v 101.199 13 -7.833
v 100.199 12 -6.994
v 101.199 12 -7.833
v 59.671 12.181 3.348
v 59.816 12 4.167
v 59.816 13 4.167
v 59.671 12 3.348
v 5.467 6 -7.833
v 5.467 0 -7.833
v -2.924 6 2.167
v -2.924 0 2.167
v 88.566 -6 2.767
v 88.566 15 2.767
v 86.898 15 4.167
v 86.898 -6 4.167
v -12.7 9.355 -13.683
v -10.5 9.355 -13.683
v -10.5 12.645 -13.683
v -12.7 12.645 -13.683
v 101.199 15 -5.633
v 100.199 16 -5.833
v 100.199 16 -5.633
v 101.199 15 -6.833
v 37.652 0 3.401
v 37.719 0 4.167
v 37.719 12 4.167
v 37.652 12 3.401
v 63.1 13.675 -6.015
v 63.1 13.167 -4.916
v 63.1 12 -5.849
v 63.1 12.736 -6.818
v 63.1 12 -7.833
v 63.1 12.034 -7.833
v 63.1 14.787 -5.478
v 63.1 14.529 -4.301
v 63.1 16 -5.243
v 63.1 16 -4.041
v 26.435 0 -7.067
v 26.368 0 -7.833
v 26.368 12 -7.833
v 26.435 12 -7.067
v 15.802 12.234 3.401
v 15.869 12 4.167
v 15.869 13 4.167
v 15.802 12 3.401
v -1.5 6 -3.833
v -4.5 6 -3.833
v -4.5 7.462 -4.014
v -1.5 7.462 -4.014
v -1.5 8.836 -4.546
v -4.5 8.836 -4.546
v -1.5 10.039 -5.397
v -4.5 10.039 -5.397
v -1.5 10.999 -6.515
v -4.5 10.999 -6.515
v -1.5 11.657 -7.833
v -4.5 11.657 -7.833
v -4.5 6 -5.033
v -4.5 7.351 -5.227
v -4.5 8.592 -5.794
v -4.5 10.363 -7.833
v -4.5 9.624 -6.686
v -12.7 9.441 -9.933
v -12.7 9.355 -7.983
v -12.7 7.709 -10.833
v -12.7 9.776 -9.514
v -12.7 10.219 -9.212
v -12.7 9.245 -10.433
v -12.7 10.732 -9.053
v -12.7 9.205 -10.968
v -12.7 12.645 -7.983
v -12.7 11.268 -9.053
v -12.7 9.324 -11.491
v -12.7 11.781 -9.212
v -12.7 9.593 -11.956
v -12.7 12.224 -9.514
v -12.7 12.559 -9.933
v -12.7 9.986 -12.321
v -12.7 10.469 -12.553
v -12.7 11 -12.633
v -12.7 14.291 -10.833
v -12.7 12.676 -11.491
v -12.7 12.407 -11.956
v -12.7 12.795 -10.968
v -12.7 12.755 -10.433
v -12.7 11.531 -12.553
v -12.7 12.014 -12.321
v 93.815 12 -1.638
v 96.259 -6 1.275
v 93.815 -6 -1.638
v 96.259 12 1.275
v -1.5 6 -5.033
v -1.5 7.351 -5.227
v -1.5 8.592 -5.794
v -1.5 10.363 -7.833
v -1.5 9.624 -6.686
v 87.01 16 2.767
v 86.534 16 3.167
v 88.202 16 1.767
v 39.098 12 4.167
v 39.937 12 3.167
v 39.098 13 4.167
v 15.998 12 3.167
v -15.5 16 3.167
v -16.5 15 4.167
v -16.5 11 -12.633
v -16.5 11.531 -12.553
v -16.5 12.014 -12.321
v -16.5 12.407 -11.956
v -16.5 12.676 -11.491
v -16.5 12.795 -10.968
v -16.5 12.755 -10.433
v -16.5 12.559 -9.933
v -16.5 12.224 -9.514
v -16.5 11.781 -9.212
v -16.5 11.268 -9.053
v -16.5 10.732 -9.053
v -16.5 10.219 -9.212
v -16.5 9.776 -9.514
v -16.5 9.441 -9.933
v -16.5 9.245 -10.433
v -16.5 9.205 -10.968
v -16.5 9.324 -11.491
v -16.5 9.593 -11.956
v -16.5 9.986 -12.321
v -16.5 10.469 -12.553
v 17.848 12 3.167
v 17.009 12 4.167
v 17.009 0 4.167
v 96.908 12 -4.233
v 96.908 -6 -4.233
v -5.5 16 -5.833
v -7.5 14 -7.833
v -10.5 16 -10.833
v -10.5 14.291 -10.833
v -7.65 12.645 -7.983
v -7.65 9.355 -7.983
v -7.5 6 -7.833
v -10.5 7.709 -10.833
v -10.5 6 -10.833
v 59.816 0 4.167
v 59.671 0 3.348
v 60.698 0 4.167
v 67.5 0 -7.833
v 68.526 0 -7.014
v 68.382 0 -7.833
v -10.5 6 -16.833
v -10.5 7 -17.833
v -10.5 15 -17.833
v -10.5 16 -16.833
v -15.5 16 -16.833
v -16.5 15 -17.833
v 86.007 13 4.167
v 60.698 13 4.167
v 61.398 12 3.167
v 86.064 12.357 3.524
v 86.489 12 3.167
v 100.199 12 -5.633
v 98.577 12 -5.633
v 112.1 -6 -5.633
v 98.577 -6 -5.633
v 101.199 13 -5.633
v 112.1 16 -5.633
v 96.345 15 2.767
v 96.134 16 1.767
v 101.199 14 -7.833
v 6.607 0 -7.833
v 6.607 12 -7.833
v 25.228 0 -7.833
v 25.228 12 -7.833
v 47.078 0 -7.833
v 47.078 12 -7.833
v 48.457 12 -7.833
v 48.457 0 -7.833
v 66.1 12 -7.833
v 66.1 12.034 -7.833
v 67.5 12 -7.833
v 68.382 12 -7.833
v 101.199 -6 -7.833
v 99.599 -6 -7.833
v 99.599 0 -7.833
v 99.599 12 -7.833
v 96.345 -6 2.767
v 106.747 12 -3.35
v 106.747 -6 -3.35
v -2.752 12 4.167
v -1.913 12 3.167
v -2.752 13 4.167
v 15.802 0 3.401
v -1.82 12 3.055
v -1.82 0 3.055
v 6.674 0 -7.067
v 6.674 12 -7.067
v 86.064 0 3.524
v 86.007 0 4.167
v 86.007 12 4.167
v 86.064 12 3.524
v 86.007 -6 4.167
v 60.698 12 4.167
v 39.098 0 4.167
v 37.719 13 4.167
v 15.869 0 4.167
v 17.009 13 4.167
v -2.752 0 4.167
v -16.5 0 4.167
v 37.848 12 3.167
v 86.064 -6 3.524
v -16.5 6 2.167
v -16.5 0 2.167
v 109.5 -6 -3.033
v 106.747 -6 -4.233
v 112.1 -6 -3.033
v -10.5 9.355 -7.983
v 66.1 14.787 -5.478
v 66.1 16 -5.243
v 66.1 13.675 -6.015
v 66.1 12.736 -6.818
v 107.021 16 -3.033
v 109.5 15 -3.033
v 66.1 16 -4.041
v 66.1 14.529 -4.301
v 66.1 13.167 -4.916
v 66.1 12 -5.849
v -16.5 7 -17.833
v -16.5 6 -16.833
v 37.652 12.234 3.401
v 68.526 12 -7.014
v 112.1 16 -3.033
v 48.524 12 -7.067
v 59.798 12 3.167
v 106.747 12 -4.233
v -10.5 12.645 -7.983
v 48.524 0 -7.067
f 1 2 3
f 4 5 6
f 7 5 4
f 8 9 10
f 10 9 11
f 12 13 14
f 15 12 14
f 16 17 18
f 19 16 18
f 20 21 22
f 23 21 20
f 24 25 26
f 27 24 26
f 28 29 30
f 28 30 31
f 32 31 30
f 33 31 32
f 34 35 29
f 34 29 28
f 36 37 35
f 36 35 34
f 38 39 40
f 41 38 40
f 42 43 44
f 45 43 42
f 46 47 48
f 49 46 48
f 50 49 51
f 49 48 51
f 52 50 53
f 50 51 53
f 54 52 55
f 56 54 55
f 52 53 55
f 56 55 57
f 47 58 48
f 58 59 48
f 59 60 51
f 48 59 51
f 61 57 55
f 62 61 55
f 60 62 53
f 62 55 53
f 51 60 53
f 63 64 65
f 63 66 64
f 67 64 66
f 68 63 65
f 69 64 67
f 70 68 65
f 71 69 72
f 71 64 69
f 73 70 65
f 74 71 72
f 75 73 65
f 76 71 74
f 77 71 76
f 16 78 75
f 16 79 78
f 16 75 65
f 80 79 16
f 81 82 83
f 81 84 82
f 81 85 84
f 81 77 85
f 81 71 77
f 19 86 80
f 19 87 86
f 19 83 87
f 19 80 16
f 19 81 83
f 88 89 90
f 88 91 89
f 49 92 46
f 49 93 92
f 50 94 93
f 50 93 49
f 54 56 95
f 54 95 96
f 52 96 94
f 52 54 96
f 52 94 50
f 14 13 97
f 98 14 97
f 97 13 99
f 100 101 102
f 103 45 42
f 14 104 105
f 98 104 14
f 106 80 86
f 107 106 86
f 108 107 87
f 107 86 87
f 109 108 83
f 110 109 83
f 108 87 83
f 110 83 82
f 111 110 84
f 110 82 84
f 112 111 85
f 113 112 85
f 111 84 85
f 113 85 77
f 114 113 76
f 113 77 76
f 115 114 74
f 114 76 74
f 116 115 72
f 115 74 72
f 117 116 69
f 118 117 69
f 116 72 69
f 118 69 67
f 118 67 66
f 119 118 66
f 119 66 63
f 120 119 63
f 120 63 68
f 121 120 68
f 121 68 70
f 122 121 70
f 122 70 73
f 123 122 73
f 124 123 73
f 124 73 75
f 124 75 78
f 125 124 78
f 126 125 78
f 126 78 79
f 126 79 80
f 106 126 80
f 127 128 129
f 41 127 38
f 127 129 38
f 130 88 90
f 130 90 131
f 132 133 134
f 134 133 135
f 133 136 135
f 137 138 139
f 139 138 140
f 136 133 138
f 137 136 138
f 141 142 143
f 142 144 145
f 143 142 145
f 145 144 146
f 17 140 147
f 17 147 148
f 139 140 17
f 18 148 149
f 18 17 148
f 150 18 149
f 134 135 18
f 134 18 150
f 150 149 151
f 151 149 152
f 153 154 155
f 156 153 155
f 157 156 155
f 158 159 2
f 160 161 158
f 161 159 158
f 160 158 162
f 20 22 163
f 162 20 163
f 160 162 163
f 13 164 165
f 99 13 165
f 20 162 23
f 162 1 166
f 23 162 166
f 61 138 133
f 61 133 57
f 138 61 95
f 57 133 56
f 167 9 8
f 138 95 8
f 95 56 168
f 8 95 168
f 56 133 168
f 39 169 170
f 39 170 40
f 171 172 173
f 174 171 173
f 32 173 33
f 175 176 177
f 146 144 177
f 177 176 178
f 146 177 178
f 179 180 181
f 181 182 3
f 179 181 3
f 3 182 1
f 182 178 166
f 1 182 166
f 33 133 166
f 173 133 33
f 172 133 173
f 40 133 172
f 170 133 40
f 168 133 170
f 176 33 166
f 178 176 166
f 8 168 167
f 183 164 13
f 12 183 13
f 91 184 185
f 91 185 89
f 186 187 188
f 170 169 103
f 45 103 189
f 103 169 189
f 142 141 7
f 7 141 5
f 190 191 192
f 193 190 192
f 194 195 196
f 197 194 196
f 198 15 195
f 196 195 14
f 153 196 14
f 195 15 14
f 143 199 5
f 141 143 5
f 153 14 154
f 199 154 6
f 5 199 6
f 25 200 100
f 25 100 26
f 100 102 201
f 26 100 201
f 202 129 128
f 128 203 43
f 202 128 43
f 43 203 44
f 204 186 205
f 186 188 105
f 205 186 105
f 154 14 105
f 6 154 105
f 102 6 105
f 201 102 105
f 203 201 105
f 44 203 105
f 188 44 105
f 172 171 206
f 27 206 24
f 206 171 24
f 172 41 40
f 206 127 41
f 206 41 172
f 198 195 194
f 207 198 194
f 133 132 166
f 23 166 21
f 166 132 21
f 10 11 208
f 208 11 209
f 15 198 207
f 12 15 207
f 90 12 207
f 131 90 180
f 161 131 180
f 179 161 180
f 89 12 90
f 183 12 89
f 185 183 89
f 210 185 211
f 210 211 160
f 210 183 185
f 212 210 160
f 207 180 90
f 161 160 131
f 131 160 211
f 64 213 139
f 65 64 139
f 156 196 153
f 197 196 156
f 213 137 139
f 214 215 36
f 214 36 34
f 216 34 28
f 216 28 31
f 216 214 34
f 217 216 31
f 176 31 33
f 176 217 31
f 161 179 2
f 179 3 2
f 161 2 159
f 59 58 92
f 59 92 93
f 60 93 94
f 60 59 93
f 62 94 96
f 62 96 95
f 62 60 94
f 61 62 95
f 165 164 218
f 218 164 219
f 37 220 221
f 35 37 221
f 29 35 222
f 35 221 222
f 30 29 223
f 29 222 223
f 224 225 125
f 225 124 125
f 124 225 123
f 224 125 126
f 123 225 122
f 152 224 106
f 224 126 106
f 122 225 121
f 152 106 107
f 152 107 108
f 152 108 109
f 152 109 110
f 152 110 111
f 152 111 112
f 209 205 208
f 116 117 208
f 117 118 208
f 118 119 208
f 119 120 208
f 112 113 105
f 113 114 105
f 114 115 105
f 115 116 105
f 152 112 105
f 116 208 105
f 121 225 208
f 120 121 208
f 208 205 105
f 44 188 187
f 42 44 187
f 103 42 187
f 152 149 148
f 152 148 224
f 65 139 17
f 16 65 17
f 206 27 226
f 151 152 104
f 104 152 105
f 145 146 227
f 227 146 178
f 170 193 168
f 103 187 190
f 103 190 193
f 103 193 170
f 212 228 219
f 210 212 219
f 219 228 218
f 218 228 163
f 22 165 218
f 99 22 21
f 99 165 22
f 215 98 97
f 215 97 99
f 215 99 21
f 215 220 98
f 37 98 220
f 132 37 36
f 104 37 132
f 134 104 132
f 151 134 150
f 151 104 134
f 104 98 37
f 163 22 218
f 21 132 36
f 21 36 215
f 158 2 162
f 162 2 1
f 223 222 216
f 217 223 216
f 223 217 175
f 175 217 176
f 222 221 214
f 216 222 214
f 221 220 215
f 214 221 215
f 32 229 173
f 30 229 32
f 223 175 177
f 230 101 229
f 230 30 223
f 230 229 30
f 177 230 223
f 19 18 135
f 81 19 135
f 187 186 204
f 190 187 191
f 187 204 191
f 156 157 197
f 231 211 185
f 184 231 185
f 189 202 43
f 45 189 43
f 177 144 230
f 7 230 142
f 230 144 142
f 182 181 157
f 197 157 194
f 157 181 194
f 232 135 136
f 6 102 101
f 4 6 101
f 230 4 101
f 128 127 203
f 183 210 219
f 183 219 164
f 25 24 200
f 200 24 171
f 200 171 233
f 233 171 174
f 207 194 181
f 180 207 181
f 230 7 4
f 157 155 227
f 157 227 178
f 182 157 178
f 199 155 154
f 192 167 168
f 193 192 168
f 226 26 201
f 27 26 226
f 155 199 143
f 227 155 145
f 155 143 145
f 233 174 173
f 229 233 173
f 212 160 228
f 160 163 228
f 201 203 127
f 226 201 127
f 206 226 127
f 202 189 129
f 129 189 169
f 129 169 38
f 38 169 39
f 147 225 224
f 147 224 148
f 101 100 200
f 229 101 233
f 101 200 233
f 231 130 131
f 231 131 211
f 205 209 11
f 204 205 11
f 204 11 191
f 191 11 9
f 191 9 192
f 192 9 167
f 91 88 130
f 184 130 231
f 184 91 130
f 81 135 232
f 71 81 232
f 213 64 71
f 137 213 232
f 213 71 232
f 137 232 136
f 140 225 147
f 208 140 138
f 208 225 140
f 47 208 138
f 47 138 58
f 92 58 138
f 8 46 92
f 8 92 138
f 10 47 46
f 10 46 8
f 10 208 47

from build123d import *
from OCP.BRepFilletAPI import BRepFilletAPI_MakeChamfer

# Parameters (mm, degrees)
SKETCH1_W           = 126
SKETCH1_H           = 12
BOSS_EXTRUDE1_DEPTH = 16
SKETCH2_W           = 6
SKETCH2_H           = 16
BOSS_EXTRUDE2_DEPTH = 10
SKETCH3_R           = 1.8
CUT_EXTRUDE1_DEPTH  = 10
CUT_EXTRUDE2_DEPTH  = 2.2
CHAMFER1_SIZE       = 3
CUT_EXTRUDE4_DEPTH  = 12
CUT_EXTRUDE5_DEPTH  = 6
SKETCH8_W           = 8.301447347
SKETCH8_H           = 4
CUT_EXTRUDE6_DEPTH  = 2.2
CUT_EXTRUDE7_DEPTH  = 112.589774522
SKETCH10_W          = 2.6
SKETCH10_H          = 16
BOSS_EXTRUDE3_DEPTH = 2.6
CHAMFER2_SIZE       = 2
CHAMFER3_SIZE       = 1
CHAMFER3_SIZE2      = 0.709807814
CHAMFER3_SIZE2_2    = 0.718015043
CUT_EXTRUDE8_START  = -12
SKETCH11_R          = 6
SKETCH11_R_2        = 4.8
CUT_EXTRUDE8_DEPTH  = 3
BOSS_EXTRUDE4_DEPTH = 6
CHAMFER4_SIZE       = 1
CUT_EXTRUDE9_START  = -46
SKETCH13_R          = 6
SKETCH13_R_2        = 4.8
CUT_EXTRUDE9_DEPTH  = 3


with BuildPart() as part:
    # Sketch1 → Boss-Extrude1 (new body)
    with BuildSketch(Plane(origin=(0, 0, 0), x_dir=(1, 0, 0), z_dir=(0, 1, 0))):
        with Locations((46.5, 1.833333333)):
            Rectangle(SKETCH1_W, SKETCH1_H)
    extrude(amount=BOSS_EXTRUDE1_DEPTH)

    # Sketch2 → Boss-Extrude2 (add)
    with BuildSketch(Plane(origin=(0, 0, -7.833333333), x_dir=(-1, 0, 0), z_dir=(0, 0, -1))):
        with Locations((13.5, 8)):
            Rectangle(SKETCH2_W, SKETCH2_H)
    extrude(amount=BOSS_EXTRUDE2_DEPTH)

    # Sketch3 → Cut-Extrude1 (cut)
    with BuildSketch(Plane(origin=(-10.5, 0, 0), x_dir=(0, 0, -1), z_dir=(1, 0, 0))):
        with Locations((10.833333333, 11)):
            Circle(SKETCH3_R)
    extrude(amount=-CUT_EXTRUDE1_DEPTH, mode=Mode.SUBTRACT)

    # Sketch4 → Cut-Extrude2 (cut)
    with BuildSketch(Plane(origin=(-10.5, 0, 0), x_dir=(0, 0, -1), z_dir=(1, 0, 0))):
        Polygon((7.983333333, 12.645448267), (7.983333333, 9.354551733), (10.833333333, 7.709103466), (13.683333333, 9.354551733), (13.683333333, 12.645448267), (10.833333333, 14.290896534), align=None)
    extrude(amount=-CUT_EXTRUDE2_DEPTH, mode=Mode.SUBTRACT)

    # Chamfer1
    # the kernel refuses this chamfer: 3 mm, written as the material it adds along each edge
    with BuildSketch(Plane(origin=(-10.5, 0, -7.833333333), x_dir=(1, 0, 0), z_dir=(0, 1, 0))) as chamfer1_piece_1_section:
        Polygon((CHAMFER1_SIZE, 0), (0, CHAMFER1_SIZE), (0, 0), align=None)
    chamfer1_piece_1 = extrude(amount=16, mode=Mode.PRIVATE)
    chamfer1_piece_1 = split(chamfer1_piece_1, bisect_by=Plane(origin=(-10.5, 0, -7.983333333), z_dir=(0, 0, 1)), keep=Keep.TOP, mode=Mode.PRIVATE)
    add(chamfer1_piece_1)
    with BuildSketch(Plane(origin=(-10.5, 0, -7.833333333), x_dir=(1, 0, 0), z_dir=(0, 1, 0))) as chamfer1_piece_2_section:
        Polygon((CHAMFER1_SIZE, 0), (0, CHAMFER1_SIZE), (0, 0), align=None)
    chamfer1_piece_2 = extrude(amount=23.715048964, mode=Mode.PRIVATE)
    chamfer1_piece_2 = split(chamfer1_piece_2, bisect_by=Plane(origin=(-10.5, 7.080865705, -11.921473054), z_dir=(0, -0.8660254037844421, 0.499999999999994)), keep=Keep.TOP, mode=Mode.PRIVATE)
    add(chamfer1_piece_2)
    with BuildSketch(Plane(origin=(-10.5, -7.715048964, -7.833333333), x_dir=(1, 0, 0), z_dir=(0, 1, 0))) as chamfer1_piece_3_section:
        Polygon((CHAMFER1_SIZE, 0), (0, CHAMFER1_SIZE), (0, 0), align=None)
    chamfer1_piece_3 = extrude(amount=23.715048964, mode=Mode.PRIVATE)
    chamfer1_piece_3 = split(chamfer1_piece_3, bisect_by=Plane(origin=(-10.5, 7.490372054, 0.945520585), z_dir=(0, 0.8660254037844354, 0.5000000000000058)), keep=Keep.TOP, mode=Mode.PRIVATE)
    add(chamfer1_piece_3)

    # Sketch6 → Cut-Extrude4 (cut)
    with BuildSketch(Plane.XZ):
        Polygon((27.078053453, -7.833333333), (47.078053453, -7.833333333), (37.008857879, 4.166666667), (17.008857879, 4.166666667), align=None)
        Polygon((49.166705116, -7.833333333), (67.5, -7.833333333), (59.097509541, 4.166666667), (39.097509541, 4.166666667), align=None)
        Polygon((7.316705116, -7.833333333), (25.228053453, -7.833333333), (15.158857879, 4.166666667), (-2.752490459, 4.166666667), (-1.819672283, 3.054977255), align=None)
        Polygon((60.697509541, 4.166666667), (69.1, -7.833333333), (99.598552653, -7.833333333), (85.297509541, 4.166666667), align=None)
        Polygon((109.5, 2.766666667), (96.345030751, 2.766666667), (109.5, -3.033333333), align=None)
        Polygon((93.814978285, -1.637778805), (96.908239719, -4.233333333), (106.747497018, -4.233333333), (106.747497018, -3.349795), (96.258797751, 1.274651823), align=None)
        Polygon((98.576694749, -5.633333333), (101.198552653, -7.833333333), (109.5, -7.833333333), (109.5, -5.633333333), align=None)
        Polygon((109.5, 4.166666667), (86.897509541, 4.166666667), (88.565964571, 2.766666667), (96.345030751, 2.766666667), (109.5, 2.766666667), align=None)
    extrude(amount=-CUT_EXTRUDE4_DEPTH, mode=Mode.SUBTRACT)

    # Sketch7 → Cut-Extrude5 (cut)
    with BuildSketch(Plane.XZ):
        Polygon((5.466705116, -7.833333333), (-2.924291196, 2.166666667), (-16.5, 2.166666667), (-16.5, -17.833333333), (-10.5, -17.833333333), (-10.5, -10.833333333), (-7.5, -7.833333333), align=None)
    extrude(amount=-CUT_EXTRUDE5_DEPTH, mode=Mode.SUBTRACT)

    # Sketch8 → Cut-Extrude6 (cut)
    with BuildSketch(Plane(origin=(0, 0, -7.833333333), x_dir=(-1, 0, 0), z_dir=(0, 0, -1))):
        with Locations((-105.349276327, 14)):
            Rectangle(SKETCH8_W, SKETCH8_H)
    extrude(amount=-CUT_EXTRUDE6_DEPTH, mode=Mode.SUBTRACT)

    # Sketch9 → Cut-Extrude7 (cut, through all)
    with BuildSketch(Plane.XZ.offset(-12)):
        Polygon((109.5, -3.033333333), (109.5, 4.166666667), (86.897509541, 4.166666667), (88.565964571, 2.766666667), (96.345030751, 2.766666667), align=None)
    extrude(amount=-CUT_EXTRUDE7_DEPTH, mode=Mode.SUBTRACT)

    # Sketch10 → Boss-Extrude3 (add)
    with BuildSketch(Plane(origin=(109.5, 0, 0), x_dir=(0, 0, -1), z_dir=(1, 0, 0))):
        with Locations((4.333333333, 8)):
            Rectangle(SKETCH10_W, SKETCH10_H)
    extrude(amount=BOSS_EXTRUDE3_DEPTH)

    # Chamfer2
    chamfer2_edges = [part.edges().sort_by_distance(p)[0] for p in [
        (46.849276326, 16, -7.833333333),
    ]]
    chamfer(chamfer2_edges, length=CHAMFER2_SIZE)

    # Chamfer3: one chamfer whose edges measure the first distance from different faces: ONE call of the kernel's chamfer builder (chamfer() names one face for all edges)
    chamfer3_edges_1 = [part.edges().sort_by_distance(p)[0] for p in [
        (7.316705116, 6, -7.833333333),
    ]]
    chamfer3_side_1 = [part.faces().sort_by_distance(p)[0] for p in [
        (2.282107329, 6, -1.833333333),
    ]]
    chamfer3_edges_2 = [part.edges().sort_by_distance(p)[0] for p in [
        (15.158857879, 6, 4.166666667),
    ]]
    chamfer3_side_2 = [part.faces().sort_by_distance(p)[0] for p in [
        (20.193455666, 6, -1.833333333),
    ]]
    chamfer3_edges_3 = [part.edges().sort_by_distance(p)[0] for p in [
        (59.097509541, 6, 4.166666667),
    ]]
    chamfer3_side_3 = [part.faces().sort_by_distance(p)[0] for p in [
        (63.298754771, 6, -1.833333333),
    ]]
    chamfer3_edges_4 = [part.edges().sort_by_distance(p)[0] for p in [
        (49.166705116, 6, -7.833333333),
    ]]
    chamfer3_side_4 = [part.faces().sort_by_distance(p)[0] for p in [
        (44.132107329, 6, -1.833333333),
    ]]
    chamfer3_edges_5 = [part.edges().sort_by_distance(p)[0] for p in [
        (37.008857879, 6, 4.166666667),
    ]]
    chamfer3_side_5 = [part.faces().sort_by_distance(p)[0] for p in [
        (42.043455666, 6, -1.833333333),
    ]]
    chamfer3_edges_6 = [part.edges().sort_by_distance(p)[0] for p in [
        (27.078053453, 6, -7.833333333),
    ]]
    chamfer3_side_6 = [part.faces().sort_by_distance(p)[0] for p in [
        (22.043455666, 6, -1.833333333),
    ]]
    chamfer3_edges_7 = [part.edges().sort_by_distance(p)[0] for p in [
        (-13.5, 16, -17.833333333),
        (-13.5, 6, -17.833333333),
        (-16.5, 16, -6.833333333),
        (35.198754771, 16, 4.166666667),
    ]]
    chamfer3_edges_8 = [part.edges().sort_by_distance(p)[0] for p in [
        (85.297509541, 6, 4.166666667),
    ]]
    chamfer3_side_8 = [part.faces().sort_by_distance(p)[0] for p in [
        (92.448031097, 6, -1.833333333),
    ]]
    chamfer3_edges_9 = [part.edges().sort_by_distance(p)[0] for p in [
        (69.1, 6, -7.833333333),
    ]]
    chamfer3_side_9 = [part.faces().sort_by_distance(p)[0] for p in [
        (64.898754771, 6, -1.833333333),
    ]]
    chamfer3 = BRepFilletAPI_MakeChamfer(part.part.solid().wrapped)
    for e in chamfer3_edges_1:
        chamfer3.Add(CHAMFER3_SIZE, CHAMFER3_SIZE2, e.wrapped, chamfer3_side_1[0].wrapped)  # the first distance lies on this face
    for e in chamfer3_edges_2:
        chamfer3.Add(CHAMFER3_SIZE, CHAMFER3_SIZE2, e.wrapped, chamfer3_side_2[0].wrapped)  # the first distance lies on this face
    for e in chamfer3_edges_3:
        chamfer3.Add(CHAMFER3_SIZE, CHAMFER3_SIZE2_2, e.wrapped, chamfer3_side_3[0].wrapped)  # the first distance lies on this face
    for e in chamfer3_edges_4:
        chamfer3.Add(CHAMFER3_SIZE, CHAMFER3_SIZE2, e.wrapped, chamfer3_side_4[0].wrapped)  # the first distance lies on this face
    for e in chamfer3_edges_5:
        chamfer3.Add(CHAMFER3_SIZE, CHAMFER3_SIZE2, e.wrapped, chamfer3_side_5[0].wrapped)  # the first distance lies on this face
    for e in chamfer3_edges_6:
        chamfer3.Add(CHAMFER3_SIZE, CHAMFER3_SIZE2, e.wrapped, chamfer3_side_6[0].wrapped)  # the first distance lies on this face
    for e in chamfer3_edges_7:
        chamfer3.Add(CHAMFER3_SIZE, e.wrapped)
    for e in chamfer3_edges_8:
        chamfer3.Add(CHAMFER3_SIZE, CHAMFER3_SIZE2, e.wrapped, chamfer3_side_8[0].wrapped)  # the first distance lies on this face
    for e in chamfer3_edges_9:
        chamfer3.Add(CHAMFER3_SIZE, CHAMFER3_SIZE2_2, e.wrapped, chamfer3_side_9[0].wrapped)  # the first distance lies on this face
    add(Compound.cast(chamfer3.Shape()), mode=Mode.REPLACE)

    # Sketch11 → Cut-Extrude8 (cut)
    with BuildSketch(Plane.ZY.offset(16.5).offset(CUT_EXTRUDE8_START)):
        with Locations((-9.833333333, 6)):
            Circle(SKETCH11_R)
        with Locations((-9.833333333, 6)):
            Circle(SKETCH11_R_2, mode=Mode.SUBTRACT)
    extrude(amount=-CUT_EXTRUDE8_DEPTH, mode=Mode.SUBTRACT)

    # Sketch12 → Boss-Extrude4 (add)
    with BuildSketch(Plane.XZ):
        Polygon((86.007317356, 4.166666667), (86.063553985, 3.523879057), (99.598552653, -7.833333333), (101.198552653, -7.833333333), (98.576694749, -5.633333333), (112.1, -5.633333333), (112.1, -3.033333333), (109.5, -3.033333333), (96.345030751, 2.766666667), (88.565964571, 2.766666667), (86.897509541, 4.166666667), align=None)
        Polygon((96.258797751, 1.274651823), (93.814978285, -1.637778805), (96.908239719, -4.233333333), (106.747497018, -4.233333333), (106.747497018, -3.349795), align=None, mode=Mode.SUBTRACT)
    extrude(amount=BOSS_EXTRUDE4_DEPTH)

    # Chamfer4
    # the kernel refuses this chamfer: 1 mm, written as the material it takes off along each edge
    with BuildSketch(Plane(origin=(-5.324173446, 12, 4.166666667), x_dir=(0, 1, 0), z_dir=(1, 0, 0))) as chamfer4_piece_1_section:
        Polygon((CHAMFER4_SIZE, 0), (0, -CHAMFER4_SIZE), (0, 0), align=None)
    chamfer4_piece_1 = extrude(amount=23.764522127, mode=Mode.PRIVATE)
    chamfer4_piece_1 = split(chamfer4_piece_1, bisect_by=Plane(origin=(-3.81504792, 12, 5.432973339), z_dir=(0.7660444431189749, 0, 0.6427876096865432)), keep=Keep.TOP, mode=Mode.PRIVATE)
    chamfer4_piece_1 = split(chamfer4_piece_1, bisect_by=Plane(origin=(6.695762747, 12, 14.252590694), z_dir=(-0.766044443118975, 0, -0.642787609686543)), keep=Keep.TOP, mode=Mode.PRIVATE)
    add(chamfer4_piece_1, mode=Mode.SUBTRACT)
    with BuildSketch(Plane(origin=(-5.324173446, 12, 4.166666667), x_dir=(0, 1, 0), z_dir=(1, 0, 0))) as chamfer4_piece_2_section:
        Polygon((CHAMFER4_SIZE, 0), (0, -CHAMFER4_SIZE), (0, 0), align=None)
    chamfer4_piece_2 = extrude(amount=23.764522127, mode=Mode.PRIVATE)
    chamfer4_piece_2 = split(chamfer4_piece_2, bisect_by=Plane(origin=(15.707682269, 12, 2.326617719), z_dir=(-0.9961946980917459, 0, 0.08715574274765488)), keep=Keep.TOP, mode=Mode.PRIVATE)
    chamfer4_piece_2 = split(chamfer4_piece_2, bisect_by=Plane(origin=(6.695762747, 12, 14.252590694), z_dir=(0.766044443118975, 0, 0.642787609686543)), keep=Keep.TOP, mode=Mode.PRIVATE)
    add(chamfer4_piece_2, mode=Mode.SUBTRACT)
    with BuildSketch(Plane(origin=(-5.324173446, 12, 4.166666667), x_dir=(0, 1, 0), z_dir=(1, 0, 0))) as chamfer4_piece_3_section:
        Polygon((CHAMFER4_SIZE, 0), (0, -CHAMFER4_SIZE), (0, 0), align=None)
    chamfer4_piece_3 = extrude(amount=23.764522127, mode=Mode.PRIVATE)
    chamfer4_piece_3 = split(chamfer4_piece_3, bisect_by=Plane(origin=(7.781387312, 12, 15.163537865), z_dir=(0.7660444431189742, 0, 0.642787609686544)), keep=Keep.TOP, mode=Mode.PRIVATE)
    add(chamfer4_piece_3, mode=Mode.SUBTRACT)
    with BuildSketch(Plane(origin=(36.525826554, 12, 4.166666667), x_dir=(0, 1, 0), z_dir=(1, 0, 0))) as chamfer4_piece_4_section:
        Polygon((CHAMFER4_SIZE, 0), (0, -CHAMFER4_SIZE), (0, 0), align=None)
    chamfer4_piece_4 = extrude(amount=25.861381019, mode=Mode.PRIVATE)
    chamfer4_piece_4 = split(chamfer4_piece_4, bisect_by=Plane(origin=(36.809280971, 12, 4.404513164), z_dir=(-0.7660444431189739, 0, -0.6427876096865442)), keep=Keep.TOP, mode=Mode.PRIVATE)
    add(chamfer4_piece_4, mode=Mode.SUBTRACT)
    with BuildSketch(Plane(origin=(36.525826554, 12, 4.166666667), x_dir=(0, 1, 0), z_dir=(1, 0, 0))) as chamfer4_piece_5_section:
        Polygon((CHAMFER4_SIZE, 0), (0, -CHAMFER4_SIZE), (0, 0), align=None)
    chamfer4_piece_5 = extrude(amount=25.861381019, mode=Mode.PRIVATE)
    chamfer4_piece_5 = split(chamfer4_piece_5, bisect_by=Plane(origin=(37.709604739, 12, 4.063099495), z_dir=(-0.9961946980917457, 0, 0.0871557427476573)), keep=Keep.TOP, mode=Mode.PRIVATE)
    add(chamfer4_piece_5, mode=Mode.SUBTRACT)
    with BuildSketch(Plane(origin=(36.525826554, 12, 4.166666667), x_dir=(0, 1, 0), z_dir=(1, 0, 0))) as chamfer4_piece_6_section:
        Polygon((CHAMFER4_SIZE, 0), (0, -CHAMFER4_SIZE), (0, 0), align=None)
    chamfer4_piece_6 = extrude(amount=25.861381019, mode=Mode.PRIVATE)
    chamfer4_piece_6 = split(chamfer4_piece_6, bisect_by=Plane(origin=(38.03495208, 12, 5.432973339), z_dir=(0.7660444431189741, 0, 0.6427876096865441)), keep=Keep.TOP, mode=Mode.PRIVATE)
    chamfer4_piece_6 = split(chamfer4_piece_6, bisect_by=Plane(origin=(51.671653173, 12, 14.771888638), z_dir=(-0.8191520442889891, 0, -0.57357643635105)), keep=Keep.TOP, mode=Mode.PRIVATE)
    add(chamfer4_piece_6, mode=Mode.SUBTRACT)
    with BuildSketch(Plane(origin=(36.525826554, 12, 4.166666667), x_dir=(0, 1, 0), z_dir=(1, 0, 0))) as chamfer4_piece_7_section:
        Polygon((CHAMFER4_SIZE, 0), (0, -CHAMFER4_SIZE), (0, 0), align=None)
    chamfer4_piece_7 = extrude(amount=25.861381019, mode=Mode.PRIVATE)
    chamfer4_piece_7 = split(chamfer4_piece_7, bisect_by=Plane(origin=(59.113254259, 12, 0.183893737), z_dir=(-0.9848077530122082, 0, 0.17364817766692958)), keep=Keep.TOP, mode=Mode.PRIVATE)
    chamfer4_piece_7 = split(chamfer4_piece_7, bisect_by=Plane(origin=(51.671653173, 12, 14.771888638), z_dir=(0.8191520442889891, 0, 0.57357643635105)), keep=Keep.TOP, mode=Mode.PRIVATE)
    add(chamfer4_piece_7, mode=Mode.SUBTRACT)
    with BuildSketch(Plane(origin=(36.525826554, 12, 4.166666667), x_dir=(0, 1, 0), z_dir=(1, 0, 0))) as chamfer4_piece_8_section:
        Polygon((CHAMFER4_SIZE, 0), (0, -CHAMFER4_SIZE), (0, 0), align=None)
    chamfer4_piece_8 = extrude(amount=25.861381019, mode=Mode.PRIVATE)
    chamfer4_piece_8 = split(chamfer4_piece_8, bisect_by=Plane(origin=(52.745269287, 12, 15.523642735), z_dir=(0.8191520442889892, 0, 0.5735764363510499)), keep=Keep.TOP, mode=Mode.PRIVATE)
    add(chamfer4_piece_8, mode=Mode.SUBTRACT)
    with BuildSketch(Plane(origin=(14.437174891, 12, 4.166666667), x_dir=(0, 1, 0), z_dir=(1, 0, 0))) as chamfer4_piece_9_section:
        Polygon((CHAMFER4_SIZE, 0), (0, -CHAMFER4_SIZE), (0, 0), align=None)
    chamfer4_piece_9 = extrude(amount=25.85317379, mode=Mode.PRIVATE)
    chamfer4_piece_9 = split(chamfer4_piece_9, bisect_by=Plane(origin=(14.860675852, 12, 4.522026168), z_dir=(-0.766044443118975, 0, -0.642787609686543)), keep=Keep.TOP, mode=Mode.PRIVATE)
    add(chamfer4_piece_9, mode=Mode.SUBTRACT)
    with BuildSketch(Plane(origin=(14.437174891, 12, 4.166666667), x_dir=(0, 1, 0), z_dir=(1, 0, 0))) as chamfer4_piece_10_section:
        Polygon((CHAMFER4_SIZE, 0), (0, -CHAMFER4_SIZE), (0, 0), align=None)
    chamfer4_piece_10 = extrude(amount=25.85317379, mode=Mode.PRIVATE)
    chamfer4_piece_10 = split(chamfer4_piece_10, bisect_by=Plane(origin=(15.857791912, 12, 4.042378782), z_dir=(-0.9961946980917459, 0, 0.08715574274765488)), keep=Keep.TOP, mode=Mode.PRIVATE)
    add(chamfer4_piece_10, mode=Mode.SUBTRACT)
    with BuildSketch(Plane(origin=(14.437174891, 12, 4.166666667), x_dir=(0, 1, 0), z_dir=(1, 0, 0))) as chamfer4_piece_11_section:
        Polygon((CHAMFER4_SIZE, 0), (0, -CHAMFER4_SIZE), (0, 0), align=None)
    chamfer4_piece_11 = extrude(amount=25.85317379, mode=Mode.PRIVATE)
    chamfer4_piece_11 = split(chamfer4_piece_11, bisect_by=Plane(origin=(15.946300417, 12, 5.432973339), z_dir=(0.7660444431189742, 0, 0.642787609686544)), keep=Keep.TOP, mode=Mode.PRIVATE)
    chamfer4_piece_11 = split(chamfer4_piece_11, bisect_by=Plane(origin=(27.682782193, 12, 15.281050869), z_dir=(-0.7660444431189739, 0, -0.6427876096865442)), keep=Keep.TOP, mode=Mode.PRIVATE)
    add(chamfer4_piece_11, mode=Mode.SUBTRACT)
    with BuildSketch(Plane(origin=(14.437174891, 12, 4.166666667), x_dir=(0, 1, 0), z_dir=(1, 0, 0))) as chamfer4_piece_12_section:
        Polygon((CHAMFER4_SIZE, 0), (0, -CHAMFER4_SIZE), (0, 0), align=None)
    chamfer4_piece_12 = extrude(amount=25.85317379, mode=Mode.PRIVATE)
    chamfer4_piece_12 = split(chamfer4_piece_12, bisect_by=Plane(origin=(37.541816614, 12, 2.145272441), z_dir=(-0.9961946980917457, 0, 0.0871557427476573)), keep=Keep.TOP, mode=Mode.PRIVATE)
    chamfer4_piece_12 = split(chamfer4_piece_12, bisect_by=Plane(origin=(27.682782193, 12, 15.281050869), z_dir=(0.7660444431189739, 0, 0.6427876096865442)), keep=Keep.TOP, mode=Mode.PRIVATE)
    add(chamfer4_piece_12, mode=Mode.SUBTRACT)
    with BuildSketch(Plane(origin=(14.437174891, 12, 4.166666667), x_dir=(0, 1, 0), z_dir=(1, 0, 0))) as chamfer4_piece_13_section:
        Polygon((CHAMFER4_SIZE, 0), (0, -CHAMFER4_SIZE), (0, 0), align=None)
    chamfer4_piece_13 = extrude(amount=25.85317379, mode=Mode.PRIVATE)
    chamfer4_piece_13 = split(chamfer4_piece_13, bisect_by=Plane(origin=(28.908453302, 12, 16.309511045), z_dir=(0.7660444431189741, 0, 0.6427876096865441)), keep=Keep.TOP, mode=Mode.PRIVATE)
    add(chamfer4_piece_13, mode=Mode.SUBTRACT)
    with BuildSketch(Plane(origin=(101.198552653, 16, -8.405016321), x_dir=(-1, 0, 0), z_dir=(0, 0, 1))) as chamfer4_piece_14:
        Polygon((CHAMFER4_SIZE, 0), (0, CHAMFER4_SIZE), (0, 0), align=None)
    extrude(amount=2.771682988, mode=Mode.SUBTRACT)
    with BuildSketch(Plane(origin=(101.198552653, 12, -10.405016321), x_dir=(-1, 0, 0), z_dir=(0, 0, 1))) as chamfer4_piece_15_section:
        Polygon((CHAMFER4_SIZE, 0), (0, -CHAMFER4_SIZE), (0, 0), align=None)
    chamfer4_piece_15 = extrude(amount=4.771682988, mode=Mode.PRIVATE)
    chamfer4_piece_15 = split(chamfer4_piece_15, bisect_by=Plane(origin=(102.464859325, 12, -8.895890795), z_dir=(0.6427876096865404, 0, 0.7660444431189771)), keep=Keep.TOP, mode=Mode.PRIVATE)
    add(chamfer4_piece_15, mode=Mode.SUBTRACT)
    with BuildSketch(Plane(origin=(111.853120449, 16, -4.070819499), x_dir=(0, -1, 0), z_dir=(-0.9150118657328382, 0, 0.40342692717282824))) as chamfer4_piece_16_section:
        Polygon((CHAMFER4_SIZE, 0), (0, -CHAMFER4_SIZE), (0, 0), align=None)
    chamfer4_piece_16 = extrude(amount=19.52019511, mode=Mode.PRIVATE)
    chamfer4_piece_16 = split(chamfer4_piece_16, bisect_by=Plane(origin=(111.853120449, 16, -3.033333333), z_dir=(0, 0, 1)), keep=Keep.TOP, mode=Mode.PRIVATE)
    add(chamfer4_piece_16, mode=Mode.SUBTRACT)
    with BuildSketch(Plane(origin=(98.916713739, 16, 2.766666667), x_dir=(0, -1, 0), z_dir=(-1, 0, 0))) as chamfer4_piece_17_section:
        Polygon((CHAMFER4_SIZE, 0), (0, -CHAMFER4_SIZE), (0, 0), align=None)
    chamfer4_piece_17 = extrude(amount=12.922432156, mode=Mode.PRIVATE)
    chamfer4_piece_17 = split(chamfer4_piece_17, bisect_by=Plane(origin=(96.456979825, 12.173333342, -0.164730062), z_dir=(0.4545194776720475, 0.7071067811865437, 0.5416752204197035)), keep=Keep.TOP, mode=Mode.PRIVATE)
    add(chamfer4_piece_17, mode=Mode.SUBTRACT)
    with BuildSketch(Plane(origin=(90.535988034, 16, 1.113620706), x_dir=(0, -1, 0), z_dir=(-0.7660444431189763, 0, 0.6427876096865415))) as chamfer4_piece_18_section:
        Polygon((CHAMFER4_SIZE, 0), (0, -CHAMFER4_SIZE), (0, 0), align=None)
    chamfer4_piece_18 = extrude(amount=5.765655507, mode=Mode.PRIVATE)
    chamfer4_piece_18 = split(chamfer4_piece_18, bisect_by=Plane(origin=(90.535988034, 16.32652298, 1.440143686), z_dir=(0, 0.7071067811865476, 0.7071067811865476)), keep=Keep.TOP, mode=Mode.PRIVATE)
    add(chamfer4_piece_18, mode=Mode.SUBTRACT)
    with BuildSketch(Plane(origin=(58.125826554, 12, 4.166666667), x_dir=(0, 1, 0), z_dir=(1, 0, 0))) as chamfer4_piece_19_section:
        Polygon((CHAMFER4_SIZE, 0), (0, -CHAMFER4_SIZE), (0, 0), align=None)
    chamfer4_piece_19 = extrude(amount=30.45317379, mode=Mode.PRIVATE)
    chamfer4_piece_19 = split(chamfer4_piece_19, bisect_by=Plane(origin=(58.777835625, 12, 4.623208333), z_dir=(-0.8191520442889891, 0, -0.57357643635105)), keep=Keep.TOP, mode=Mode.PRIVATE)
    add(chamfer4_piece_19, mode=Mode.SUBTRACT)
    with BuildSketch(Plane(origin=(58.125826554, 12, 4.166666667), x_dir=(0, 1, 0), z_dir=(1, 0, 0))) as chamfer4_piece_20_section:
        Polygon((CHAMFER4_SIZE, 0), (0, -CHAMFER4_SIZE), (0, 0), align=None)
    chamfer4_piece_20 = extrude(amount=30.45317379, mode=Mode.PRIVATE)
    chamfer4_piece_20 = split(chamfer4_piece_20, bisect_by=Plane(origin=(59.764573955, 12, 3.877711285), z_dir=(-0.9848077530122082, 0, 0.17364817766692958)), keep=Keep.TOP, mode=Mode.PRIVATE)
    add(chamfer4_piece_20, mode=Mode.SUBTRACT)
    with BuildSketch(Plane(origin=(58.125826554, 12, 4.166666667), x_dir=(0, 1, 0), z_dir=(1, 0, 0))) as chamfer4_piece_21_section:
        Polygon((CHAMFER4_SIZE, 0), (0, -CHAMFER4_SIZE), (0, 0), align=None)
    chamfer4_piece_21 = extrude(amount=30.45317379, mode=Mode.PRIVATE)
    chamfer4_piece_21 = split(chamfer4_piece_21, bisect_by=Plane(origin=(59.85145174, 12, 5.37496243), z_dir=(0.8191520442889892, 0, 0.5735764363510499)), keep=Keep.TOP, mode=Mode.PRIVATE)
    chamfer4_piece_21 = split(chamfer4_piece_21, bisect_by=Plane(origin=(69.35251143, 12, 17.546108701), z_dir=(-0.6427876096865347, 0, -0.766044443118982)), keep=Keep.TOP, mode=Mode.PRIVATE)
    add(chamfer4_piece_21, mode=Mode.SUBTRACT)
    with BuildSketch(Plane(origin=(58.125826554, 12, 4.166666667), x_dir=(0, 1, 0), z_dir=(1, 0, 0))) as chamfer4_piece_22_section:
        Polygon((CHAMFER4_SIZE, 0), (0, -CHAMFER4_SIZE), (0, 0), align=None)
    chamfer4_piece_22 = extrude(amount=30.45317379, mode=Mode.PRIVATE)
    chamfer4_piece_22 = split(chamfer4_piece_22, bisect_by=Plane(origin=(85.795526108, 12, 6.587451701), z_dir=(-0.9961946980917439, 0, -0.08715574274767737)), keep=Keep.TOP, mode=Mode.PRIVATE)
    chamfer4_piece_22 = split(chamfer4_piece_22, bisect_by=Plane(origin=(69.35251143, 12, 17.546108701), z_dir=(0.6427876096865347, 0, 0.766044443118982)), keep=Keep.TOP, mode=Mode.PRIVATE)
    add(chamfer4_piece_22, mode=Mode.SUBTRACT)

    # Sketch13 → Cut-Extrude9 (cut)
    with BuildSketch(Plane(origin=(112.1, 0, 0), x_dir=(0, 0, -1), z_dir=(1, 0, 0)).offset(CUT_EXTRUDE9_START)):
        with Locations((10.033333333, 16.3)):
            Circle(SKETCH13_R)
        with Locations((10.033333333, 16.3)):
            Circle(SKETCH13_R_2, mode=Mode.SUBTRACT)
    extrude(amount=-CUT_EXTRUDE9_DEPTH, mode=Mode.SUBTRACT)


solid = part.part
